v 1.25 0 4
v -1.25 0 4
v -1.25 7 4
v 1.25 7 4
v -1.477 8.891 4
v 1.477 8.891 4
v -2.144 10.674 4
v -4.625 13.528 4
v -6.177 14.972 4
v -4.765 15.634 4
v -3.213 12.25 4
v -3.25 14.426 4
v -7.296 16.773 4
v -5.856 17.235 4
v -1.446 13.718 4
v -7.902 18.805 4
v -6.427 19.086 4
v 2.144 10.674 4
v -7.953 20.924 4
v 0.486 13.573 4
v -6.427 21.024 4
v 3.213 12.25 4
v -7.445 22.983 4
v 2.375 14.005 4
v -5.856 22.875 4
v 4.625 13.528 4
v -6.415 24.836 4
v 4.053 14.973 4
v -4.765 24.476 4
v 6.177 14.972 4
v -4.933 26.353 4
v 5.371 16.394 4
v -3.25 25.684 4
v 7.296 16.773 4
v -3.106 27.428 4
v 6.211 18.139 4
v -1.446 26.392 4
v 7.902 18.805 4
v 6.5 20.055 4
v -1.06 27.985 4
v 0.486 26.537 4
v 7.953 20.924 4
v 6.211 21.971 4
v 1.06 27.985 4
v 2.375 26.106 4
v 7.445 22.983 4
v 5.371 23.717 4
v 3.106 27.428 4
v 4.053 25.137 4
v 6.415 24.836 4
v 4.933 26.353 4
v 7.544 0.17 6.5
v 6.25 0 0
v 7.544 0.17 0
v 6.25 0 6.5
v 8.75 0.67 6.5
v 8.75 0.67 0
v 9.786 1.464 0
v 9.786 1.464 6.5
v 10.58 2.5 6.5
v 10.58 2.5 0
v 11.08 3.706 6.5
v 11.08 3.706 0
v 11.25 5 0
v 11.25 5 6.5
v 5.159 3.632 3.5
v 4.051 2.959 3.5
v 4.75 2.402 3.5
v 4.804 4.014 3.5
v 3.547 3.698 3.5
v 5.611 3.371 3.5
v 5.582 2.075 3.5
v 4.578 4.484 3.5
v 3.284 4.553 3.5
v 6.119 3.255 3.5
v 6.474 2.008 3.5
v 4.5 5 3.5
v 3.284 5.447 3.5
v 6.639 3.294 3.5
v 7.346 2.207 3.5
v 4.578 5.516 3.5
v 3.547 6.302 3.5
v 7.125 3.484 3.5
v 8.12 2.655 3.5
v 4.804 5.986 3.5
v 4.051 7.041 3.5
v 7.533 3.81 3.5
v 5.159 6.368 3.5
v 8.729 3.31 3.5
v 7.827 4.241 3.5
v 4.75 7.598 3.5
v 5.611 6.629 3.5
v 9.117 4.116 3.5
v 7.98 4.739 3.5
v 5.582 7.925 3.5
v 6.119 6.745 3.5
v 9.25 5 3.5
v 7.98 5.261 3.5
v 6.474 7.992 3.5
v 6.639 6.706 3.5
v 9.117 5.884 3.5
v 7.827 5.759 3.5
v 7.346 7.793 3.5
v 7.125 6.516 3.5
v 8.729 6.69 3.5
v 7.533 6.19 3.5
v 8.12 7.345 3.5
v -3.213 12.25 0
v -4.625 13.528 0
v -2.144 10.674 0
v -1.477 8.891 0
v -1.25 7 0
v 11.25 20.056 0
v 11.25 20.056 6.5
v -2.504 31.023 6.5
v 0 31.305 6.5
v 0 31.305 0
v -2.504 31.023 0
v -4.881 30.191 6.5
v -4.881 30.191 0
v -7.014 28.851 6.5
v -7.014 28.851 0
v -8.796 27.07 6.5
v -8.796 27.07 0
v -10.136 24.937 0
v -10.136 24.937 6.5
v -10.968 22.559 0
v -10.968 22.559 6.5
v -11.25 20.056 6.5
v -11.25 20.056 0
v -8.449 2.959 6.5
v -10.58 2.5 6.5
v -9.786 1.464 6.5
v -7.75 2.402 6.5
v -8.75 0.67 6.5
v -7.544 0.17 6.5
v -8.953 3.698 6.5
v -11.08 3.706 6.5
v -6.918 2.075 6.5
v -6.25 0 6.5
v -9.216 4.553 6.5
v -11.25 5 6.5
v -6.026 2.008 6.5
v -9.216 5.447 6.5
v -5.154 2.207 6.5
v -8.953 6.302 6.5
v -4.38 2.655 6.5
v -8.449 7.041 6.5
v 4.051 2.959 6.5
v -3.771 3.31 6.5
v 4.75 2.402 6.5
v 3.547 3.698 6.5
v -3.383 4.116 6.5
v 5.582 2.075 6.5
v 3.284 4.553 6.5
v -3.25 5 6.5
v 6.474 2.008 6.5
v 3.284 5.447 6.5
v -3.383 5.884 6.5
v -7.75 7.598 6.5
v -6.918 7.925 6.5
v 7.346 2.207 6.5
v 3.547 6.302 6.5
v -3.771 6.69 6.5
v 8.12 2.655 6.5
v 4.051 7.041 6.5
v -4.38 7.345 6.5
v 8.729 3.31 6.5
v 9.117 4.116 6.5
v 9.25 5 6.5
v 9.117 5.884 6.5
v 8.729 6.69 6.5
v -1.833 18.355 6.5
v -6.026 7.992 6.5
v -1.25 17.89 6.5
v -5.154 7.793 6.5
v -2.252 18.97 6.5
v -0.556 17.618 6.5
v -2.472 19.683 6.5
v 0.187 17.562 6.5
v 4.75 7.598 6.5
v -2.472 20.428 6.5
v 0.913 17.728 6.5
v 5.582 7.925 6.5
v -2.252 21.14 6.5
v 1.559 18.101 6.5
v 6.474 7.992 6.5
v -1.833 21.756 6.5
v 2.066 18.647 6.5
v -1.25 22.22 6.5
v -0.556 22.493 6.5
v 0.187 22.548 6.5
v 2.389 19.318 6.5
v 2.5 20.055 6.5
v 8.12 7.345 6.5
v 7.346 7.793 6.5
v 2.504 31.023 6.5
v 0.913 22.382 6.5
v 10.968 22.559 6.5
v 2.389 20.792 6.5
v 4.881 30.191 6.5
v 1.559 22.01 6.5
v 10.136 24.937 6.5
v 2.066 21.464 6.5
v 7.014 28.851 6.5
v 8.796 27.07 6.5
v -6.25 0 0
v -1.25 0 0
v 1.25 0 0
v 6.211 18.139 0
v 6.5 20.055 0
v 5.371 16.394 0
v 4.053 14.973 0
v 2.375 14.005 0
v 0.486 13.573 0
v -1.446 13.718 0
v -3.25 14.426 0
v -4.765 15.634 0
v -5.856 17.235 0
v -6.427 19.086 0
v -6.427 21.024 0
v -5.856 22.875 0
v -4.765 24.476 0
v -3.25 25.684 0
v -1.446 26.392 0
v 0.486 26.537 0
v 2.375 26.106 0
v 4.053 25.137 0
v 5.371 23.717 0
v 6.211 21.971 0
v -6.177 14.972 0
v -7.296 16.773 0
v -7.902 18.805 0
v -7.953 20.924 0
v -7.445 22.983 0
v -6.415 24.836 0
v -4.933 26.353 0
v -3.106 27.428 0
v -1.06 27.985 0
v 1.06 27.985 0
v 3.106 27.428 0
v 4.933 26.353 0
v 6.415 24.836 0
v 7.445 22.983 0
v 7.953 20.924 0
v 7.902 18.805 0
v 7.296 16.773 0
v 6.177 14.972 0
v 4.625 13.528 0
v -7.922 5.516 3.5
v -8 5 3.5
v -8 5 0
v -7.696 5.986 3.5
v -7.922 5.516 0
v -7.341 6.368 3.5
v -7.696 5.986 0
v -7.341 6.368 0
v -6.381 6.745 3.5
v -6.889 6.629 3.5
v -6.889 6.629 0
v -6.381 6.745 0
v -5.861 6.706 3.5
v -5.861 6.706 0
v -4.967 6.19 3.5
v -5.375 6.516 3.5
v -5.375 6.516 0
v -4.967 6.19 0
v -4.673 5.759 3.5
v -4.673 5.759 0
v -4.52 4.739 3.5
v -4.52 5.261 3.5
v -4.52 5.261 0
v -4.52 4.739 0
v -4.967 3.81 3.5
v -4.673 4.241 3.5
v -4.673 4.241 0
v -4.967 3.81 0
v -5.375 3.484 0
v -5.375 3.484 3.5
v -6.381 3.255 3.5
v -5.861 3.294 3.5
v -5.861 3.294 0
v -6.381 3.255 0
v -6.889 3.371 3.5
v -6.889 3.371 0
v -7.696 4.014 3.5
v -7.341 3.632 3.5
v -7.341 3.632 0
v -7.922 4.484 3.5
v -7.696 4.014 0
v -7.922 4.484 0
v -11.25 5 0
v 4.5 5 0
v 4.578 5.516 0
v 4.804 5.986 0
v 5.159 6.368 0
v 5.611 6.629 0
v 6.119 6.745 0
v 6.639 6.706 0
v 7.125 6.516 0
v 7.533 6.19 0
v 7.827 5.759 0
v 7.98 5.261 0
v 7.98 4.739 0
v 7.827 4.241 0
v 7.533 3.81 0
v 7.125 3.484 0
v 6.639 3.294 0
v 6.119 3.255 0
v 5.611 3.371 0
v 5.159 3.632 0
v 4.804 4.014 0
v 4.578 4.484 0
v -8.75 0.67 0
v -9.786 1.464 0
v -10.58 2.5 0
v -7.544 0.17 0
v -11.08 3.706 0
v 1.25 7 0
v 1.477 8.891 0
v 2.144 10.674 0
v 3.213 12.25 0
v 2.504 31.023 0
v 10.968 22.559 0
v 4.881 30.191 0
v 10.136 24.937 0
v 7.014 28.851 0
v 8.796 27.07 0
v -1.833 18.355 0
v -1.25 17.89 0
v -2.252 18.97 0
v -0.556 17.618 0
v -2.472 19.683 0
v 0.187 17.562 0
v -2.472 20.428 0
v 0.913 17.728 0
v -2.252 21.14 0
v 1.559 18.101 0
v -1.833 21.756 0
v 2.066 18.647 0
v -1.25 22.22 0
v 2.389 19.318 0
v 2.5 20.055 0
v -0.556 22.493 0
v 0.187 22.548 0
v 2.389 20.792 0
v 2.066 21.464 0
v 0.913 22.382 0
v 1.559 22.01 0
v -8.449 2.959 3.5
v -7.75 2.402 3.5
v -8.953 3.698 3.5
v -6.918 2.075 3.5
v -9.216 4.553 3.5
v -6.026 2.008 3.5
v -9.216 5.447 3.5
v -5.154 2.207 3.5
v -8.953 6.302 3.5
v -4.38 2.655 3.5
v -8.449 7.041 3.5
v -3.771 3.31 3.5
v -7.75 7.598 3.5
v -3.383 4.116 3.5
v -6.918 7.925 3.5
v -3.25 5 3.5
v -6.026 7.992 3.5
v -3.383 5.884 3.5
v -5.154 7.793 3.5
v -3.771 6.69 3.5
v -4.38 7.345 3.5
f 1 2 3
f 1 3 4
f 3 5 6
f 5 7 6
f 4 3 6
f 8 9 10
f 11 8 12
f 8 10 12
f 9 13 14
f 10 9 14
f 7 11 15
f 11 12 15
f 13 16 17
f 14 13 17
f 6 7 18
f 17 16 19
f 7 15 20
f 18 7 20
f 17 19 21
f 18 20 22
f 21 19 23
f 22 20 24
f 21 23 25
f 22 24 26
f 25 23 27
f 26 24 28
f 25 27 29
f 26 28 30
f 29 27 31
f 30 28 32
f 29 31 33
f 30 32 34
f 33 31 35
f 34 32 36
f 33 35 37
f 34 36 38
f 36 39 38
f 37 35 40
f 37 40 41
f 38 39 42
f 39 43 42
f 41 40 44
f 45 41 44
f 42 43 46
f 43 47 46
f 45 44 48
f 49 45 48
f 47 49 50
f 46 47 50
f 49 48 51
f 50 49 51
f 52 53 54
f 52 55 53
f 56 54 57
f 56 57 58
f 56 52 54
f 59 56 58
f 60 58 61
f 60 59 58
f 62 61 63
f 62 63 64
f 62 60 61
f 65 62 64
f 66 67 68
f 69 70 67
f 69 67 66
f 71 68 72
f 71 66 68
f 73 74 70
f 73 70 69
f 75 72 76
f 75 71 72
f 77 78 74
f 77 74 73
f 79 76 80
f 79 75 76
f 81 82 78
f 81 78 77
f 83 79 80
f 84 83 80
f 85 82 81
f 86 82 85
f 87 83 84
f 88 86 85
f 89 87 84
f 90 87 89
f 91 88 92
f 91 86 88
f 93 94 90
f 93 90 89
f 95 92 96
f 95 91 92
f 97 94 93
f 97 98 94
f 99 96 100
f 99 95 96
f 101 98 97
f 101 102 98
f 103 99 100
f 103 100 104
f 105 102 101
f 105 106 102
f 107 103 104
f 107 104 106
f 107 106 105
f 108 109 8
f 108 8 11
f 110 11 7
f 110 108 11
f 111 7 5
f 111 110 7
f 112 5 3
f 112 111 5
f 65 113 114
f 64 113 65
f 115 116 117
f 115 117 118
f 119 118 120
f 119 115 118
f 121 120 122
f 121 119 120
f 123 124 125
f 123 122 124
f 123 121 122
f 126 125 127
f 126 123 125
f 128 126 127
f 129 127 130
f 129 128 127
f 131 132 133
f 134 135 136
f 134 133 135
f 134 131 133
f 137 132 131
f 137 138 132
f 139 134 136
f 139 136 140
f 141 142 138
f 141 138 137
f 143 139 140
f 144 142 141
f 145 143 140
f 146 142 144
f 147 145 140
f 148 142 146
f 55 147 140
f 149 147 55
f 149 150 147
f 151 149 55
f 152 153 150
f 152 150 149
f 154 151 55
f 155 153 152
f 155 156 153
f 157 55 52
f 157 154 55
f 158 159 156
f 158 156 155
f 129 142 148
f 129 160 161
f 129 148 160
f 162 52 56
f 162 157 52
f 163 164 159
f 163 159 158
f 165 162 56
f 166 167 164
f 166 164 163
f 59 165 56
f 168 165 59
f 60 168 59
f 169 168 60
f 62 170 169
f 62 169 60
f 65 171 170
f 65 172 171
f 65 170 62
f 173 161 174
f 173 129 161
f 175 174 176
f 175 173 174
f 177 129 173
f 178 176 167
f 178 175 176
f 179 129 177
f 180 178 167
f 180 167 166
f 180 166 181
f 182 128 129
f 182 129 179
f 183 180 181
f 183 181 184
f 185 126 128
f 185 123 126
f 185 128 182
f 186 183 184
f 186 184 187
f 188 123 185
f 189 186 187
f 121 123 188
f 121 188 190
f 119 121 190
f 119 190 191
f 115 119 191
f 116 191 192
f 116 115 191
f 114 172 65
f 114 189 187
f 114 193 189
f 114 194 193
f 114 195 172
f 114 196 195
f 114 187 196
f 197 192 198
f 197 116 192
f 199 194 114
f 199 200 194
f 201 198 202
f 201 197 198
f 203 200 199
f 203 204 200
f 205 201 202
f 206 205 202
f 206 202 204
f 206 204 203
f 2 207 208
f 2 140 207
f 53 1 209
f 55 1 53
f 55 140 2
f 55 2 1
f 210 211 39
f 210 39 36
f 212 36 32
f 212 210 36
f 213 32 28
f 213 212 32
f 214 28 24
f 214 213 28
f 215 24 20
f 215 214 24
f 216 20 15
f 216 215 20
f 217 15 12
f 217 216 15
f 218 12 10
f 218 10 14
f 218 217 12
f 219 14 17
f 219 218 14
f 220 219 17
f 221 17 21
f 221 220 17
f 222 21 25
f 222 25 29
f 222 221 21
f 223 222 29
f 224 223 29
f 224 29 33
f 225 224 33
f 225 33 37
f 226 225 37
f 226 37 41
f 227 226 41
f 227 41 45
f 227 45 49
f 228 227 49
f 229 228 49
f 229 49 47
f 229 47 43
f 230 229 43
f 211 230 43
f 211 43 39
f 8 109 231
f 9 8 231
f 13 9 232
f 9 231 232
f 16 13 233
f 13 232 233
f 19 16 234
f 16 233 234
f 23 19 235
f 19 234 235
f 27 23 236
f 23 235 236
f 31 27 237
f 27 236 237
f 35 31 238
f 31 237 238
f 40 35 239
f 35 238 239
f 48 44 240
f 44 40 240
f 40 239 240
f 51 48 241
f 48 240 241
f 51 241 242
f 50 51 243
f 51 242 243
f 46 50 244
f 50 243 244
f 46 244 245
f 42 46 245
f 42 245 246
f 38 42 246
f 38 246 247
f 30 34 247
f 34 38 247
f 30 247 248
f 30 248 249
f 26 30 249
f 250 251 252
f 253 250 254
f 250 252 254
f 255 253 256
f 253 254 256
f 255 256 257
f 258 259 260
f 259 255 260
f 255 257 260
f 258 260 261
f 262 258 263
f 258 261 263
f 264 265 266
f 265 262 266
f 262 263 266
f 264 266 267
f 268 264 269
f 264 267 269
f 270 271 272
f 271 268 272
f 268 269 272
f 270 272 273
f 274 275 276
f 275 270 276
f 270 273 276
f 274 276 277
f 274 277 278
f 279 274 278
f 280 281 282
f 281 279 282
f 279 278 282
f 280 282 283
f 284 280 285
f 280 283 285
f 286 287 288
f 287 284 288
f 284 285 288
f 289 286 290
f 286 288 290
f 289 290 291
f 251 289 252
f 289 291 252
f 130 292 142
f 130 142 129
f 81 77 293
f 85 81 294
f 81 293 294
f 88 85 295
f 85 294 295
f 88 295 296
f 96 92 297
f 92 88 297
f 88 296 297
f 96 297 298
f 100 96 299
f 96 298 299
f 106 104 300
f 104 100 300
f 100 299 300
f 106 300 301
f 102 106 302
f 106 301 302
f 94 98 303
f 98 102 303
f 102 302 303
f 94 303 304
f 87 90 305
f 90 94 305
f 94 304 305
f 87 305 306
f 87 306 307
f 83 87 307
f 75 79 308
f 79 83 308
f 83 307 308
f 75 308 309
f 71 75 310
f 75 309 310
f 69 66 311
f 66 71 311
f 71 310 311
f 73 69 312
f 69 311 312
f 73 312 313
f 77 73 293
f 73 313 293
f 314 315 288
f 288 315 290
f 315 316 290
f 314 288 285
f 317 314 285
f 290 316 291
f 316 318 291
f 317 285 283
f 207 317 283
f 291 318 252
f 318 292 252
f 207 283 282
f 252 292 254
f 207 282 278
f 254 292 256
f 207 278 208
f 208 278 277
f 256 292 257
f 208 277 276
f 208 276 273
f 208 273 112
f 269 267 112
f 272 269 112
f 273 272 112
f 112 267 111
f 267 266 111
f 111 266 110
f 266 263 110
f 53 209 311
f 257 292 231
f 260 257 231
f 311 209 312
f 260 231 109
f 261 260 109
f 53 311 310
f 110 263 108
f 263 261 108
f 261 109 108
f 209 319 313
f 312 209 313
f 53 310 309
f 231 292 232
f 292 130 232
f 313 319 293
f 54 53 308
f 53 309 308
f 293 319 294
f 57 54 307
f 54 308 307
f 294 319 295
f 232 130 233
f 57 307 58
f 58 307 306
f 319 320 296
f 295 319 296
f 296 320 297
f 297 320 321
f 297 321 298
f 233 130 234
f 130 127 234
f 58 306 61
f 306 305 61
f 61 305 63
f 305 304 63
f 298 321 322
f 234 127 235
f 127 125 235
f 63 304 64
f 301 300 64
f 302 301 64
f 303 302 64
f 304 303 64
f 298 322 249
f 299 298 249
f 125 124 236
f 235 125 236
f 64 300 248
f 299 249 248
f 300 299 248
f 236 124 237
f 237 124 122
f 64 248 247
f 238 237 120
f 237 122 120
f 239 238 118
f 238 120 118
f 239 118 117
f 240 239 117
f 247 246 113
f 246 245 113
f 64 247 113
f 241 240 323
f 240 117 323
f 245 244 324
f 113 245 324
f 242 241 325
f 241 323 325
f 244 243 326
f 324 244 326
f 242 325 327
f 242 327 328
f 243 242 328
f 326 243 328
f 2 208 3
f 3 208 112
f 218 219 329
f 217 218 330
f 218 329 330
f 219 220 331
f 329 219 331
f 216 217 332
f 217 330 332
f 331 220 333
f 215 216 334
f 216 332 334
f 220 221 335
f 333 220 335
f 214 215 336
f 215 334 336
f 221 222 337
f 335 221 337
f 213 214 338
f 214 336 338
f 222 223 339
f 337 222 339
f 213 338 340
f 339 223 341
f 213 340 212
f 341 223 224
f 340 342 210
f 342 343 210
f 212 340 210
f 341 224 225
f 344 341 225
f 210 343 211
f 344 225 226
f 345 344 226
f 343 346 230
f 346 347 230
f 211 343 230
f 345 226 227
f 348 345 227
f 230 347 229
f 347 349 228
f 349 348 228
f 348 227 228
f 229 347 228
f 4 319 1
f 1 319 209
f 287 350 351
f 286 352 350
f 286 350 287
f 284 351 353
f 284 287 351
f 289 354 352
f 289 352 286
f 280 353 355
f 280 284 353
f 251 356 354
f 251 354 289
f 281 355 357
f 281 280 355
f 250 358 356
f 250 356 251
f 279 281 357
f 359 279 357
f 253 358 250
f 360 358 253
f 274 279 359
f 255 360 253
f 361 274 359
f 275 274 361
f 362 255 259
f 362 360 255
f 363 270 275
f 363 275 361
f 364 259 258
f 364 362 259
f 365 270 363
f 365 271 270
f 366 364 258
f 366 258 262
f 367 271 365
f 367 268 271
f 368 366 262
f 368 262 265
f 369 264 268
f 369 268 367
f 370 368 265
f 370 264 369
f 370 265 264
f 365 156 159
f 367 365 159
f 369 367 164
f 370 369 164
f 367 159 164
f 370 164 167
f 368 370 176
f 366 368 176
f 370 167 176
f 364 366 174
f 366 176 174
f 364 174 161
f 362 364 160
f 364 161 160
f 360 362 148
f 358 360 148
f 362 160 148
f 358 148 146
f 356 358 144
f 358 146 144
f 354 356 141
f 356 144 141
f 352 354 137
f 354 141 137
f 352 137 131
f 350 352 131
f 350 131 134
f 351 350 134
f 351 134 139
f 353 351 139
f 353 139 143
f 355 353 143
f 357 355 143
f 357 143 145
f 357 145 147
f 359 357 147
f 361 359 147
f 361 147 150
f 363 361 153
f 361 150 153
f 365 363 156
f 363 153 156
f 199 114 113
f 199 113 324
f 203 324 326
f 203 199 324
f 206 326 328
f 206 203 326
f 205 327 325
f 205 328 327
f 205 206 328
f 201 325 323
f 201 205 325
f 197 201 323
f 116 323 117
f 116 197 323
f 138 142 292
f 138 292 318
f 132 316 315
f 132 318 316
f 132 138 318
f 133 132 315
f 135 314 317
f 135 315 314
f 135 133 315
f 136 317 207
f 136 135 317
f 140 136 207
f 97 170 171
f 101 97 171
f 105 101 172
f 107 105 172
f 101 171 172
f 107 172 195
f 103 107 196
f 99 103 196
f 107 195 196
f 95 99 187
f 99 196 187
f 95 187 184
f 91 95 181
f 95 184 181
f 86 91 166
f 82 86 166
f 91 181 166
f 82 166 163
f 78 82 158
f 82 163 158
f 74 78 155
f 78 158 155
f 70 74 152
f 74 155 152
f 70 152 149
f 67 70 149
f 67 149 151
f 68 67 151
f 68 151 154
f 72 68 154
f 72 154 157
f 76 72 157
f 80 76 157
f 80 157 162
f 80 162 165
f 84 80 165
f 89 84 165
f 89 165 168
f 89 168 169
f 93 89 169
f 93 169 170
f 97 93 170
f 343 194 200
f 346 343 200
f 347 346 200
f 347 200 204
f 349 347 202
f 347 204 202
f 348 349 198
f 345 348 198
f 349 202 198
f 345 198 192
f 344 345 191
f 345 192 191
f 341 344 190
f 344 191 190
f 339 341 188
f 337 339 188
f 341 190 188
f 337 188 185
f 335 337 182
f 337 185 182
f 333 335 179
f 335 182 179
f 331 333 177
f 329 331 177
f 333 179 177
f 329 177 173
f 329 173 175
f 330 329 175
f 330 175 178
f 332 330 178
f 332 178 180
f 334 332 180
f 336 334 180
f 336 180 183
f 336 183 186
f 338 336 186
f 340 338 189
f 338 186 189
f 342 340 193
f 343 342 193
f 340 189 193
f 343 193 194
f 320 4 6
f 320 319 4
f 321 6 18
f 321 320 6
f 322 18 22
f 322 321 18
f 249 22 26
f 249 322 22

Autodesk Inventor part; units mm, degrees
ref_plane "YZ Plane" through (0, 0, 0) normal (1, 0, 0) x (0, 1, 0)
ref_plane "XZ Plane" through (0, 0, 0) normal (0, 1, 0) x (-1, 0, 0)
ref_plane "XY Plane" through (0, 0, 0) normal (0, 0, 1) x (1, 0, 0)
sketch "Sketch1" plane through (0, 0, 0) normal (0, 0, 1) x (1, 0, 0)
  line L0 (-1.25, 0) -> (1.25, 0)
  line L1 (-1.25, 0) -> (-1.25, 7)
  arc A0 (-1.25, 7) -> (-4.625, 13.5276) centre (-9.25, 7) ccw
  arc A1 (4.625, 13.5276) -> (-4.625, 13.5276) centre (0, 20.0552) ccw
  arc A2 (4.625, 13.5276) -> (1.25, 7) centre (9.25, 7) ccw
  line L2 (1.25, 7) -> (1.25, 0)
  circle A3 centre (0, 20.0552) radius 6.5
  line L3 (-1.25, 0) -> (-11.25, 0)
  line L4 (-11.25, 0) -> (-11.25, 31.3052)
  line L5 (-11.25, 31.3052) -> (11.25, 31.3052)
  line L6 (11.25, 31.3052) -> (11.25, 0)
  line L7 (11.25, 0) -> (1.25, 0)
  point P0 (0, 0)
  point P1 (0, 0)
  dimension "d0" = 2.5
  dimension "d3" = 7
  dimension "d4" = 1.5
  dimension "d15" = 10
  dimension "d23" = 11.25
  dimension "d24" = 8
extrude "Extrusion1" add sketch "Sketch1" along normal blind 6.5 contours L3 L4 L5 L6 L7 L2 A2 A1 A0 L1 | A3
fillet "Fillet1" radius 11.25 2 edges at (11.25, 31.3052, 3.25) (-11.25, 31.3052, 3.25)
sketch "Sketch2" plane through (0, 0, 6.5) normal (0, 0, 1) x (1, 0, 0)
  line L0 (-1.25, 0) -> (-1.25, 7) projected
  arc A0 (-1.25, 7) -> (-4.625, 13.5276) centre (-9.25, 7) ccw projected
  arc A1 (4.625, 13.5276) -> (-4.625, 13.5276) centre (0, 20.0552) ccw projected
  arc A2 (4.625, 13.5276) -> (1.25, 7) centre (9.25, 7) ccw projected
  line L1 (1.25, 7) -> (1.25, 0) projected
  line L2 (11.25, 0) -> (11.25, 20.0552) projected
  line L3 (-1.25, 0) -> (1.25, 0)
  point P0 (0, 0)
extrude "Extrusion2" add sketch "Sketch2" against normal blind 2.5
sketch "Sketch3" plane through (0, 0, 0) normal (0, 0, -1) x (-1, 0, 0)
  line L0 (-1.25, 0) -> (-11.25, 0) projected
  line L1 (11.25, 0) -> (1.25, 0) projected
  circle A0 centre (-6.25, 5) radius 1.75
  circle A1 centre (6.25, 5) radius 1.75
  point P0 (0, 0)
  point P1 (-1.25, 22.4355)
  point P2 (-6.25, 0)
  point P3 (6.25, 0)
  dimension "d13" = 5
  dimension "d14" = 3.5
extrude "Extrusion3" cut sketch "Sketch3" against normal through all
sketch "Sketch4" plane through (0, 0, 6.5) normal (0, 0, 1) x (1, 0, 0)
  circle A0 centre (6.25, 5) radius 1.75 projected
  circle A1 centre (-6.25, 5) radius 1.75 projected
  circle A2 centre (-6.25, 5) radius 3
  circle A3 centre (6.25, 5) radius 3
  point P0 (0, 0)
  dimension "d19" = 6
extrude "Extrusion4" cut sketch "Sketch4" against normal blind 3
fillet "Fillet2" radius 5 2 edges at (-11.25, 0, 3.25) (11.25, 0, 3.25)
sketch "Sketch5" plane through (0, 0, 6.5) normal (0, 0, 1) x (1, 0, 0)
  arc A0 (11.25, 20.0552) -> (-11.25, 20.0552) centre (0, 20.0552) ccw projected
  circle A1 centre (0, 20.0552) radius 2.5
  point P0 (0, 0)
  dimension "d26" = 5
extrude "Extrusion5" cut sketch "Sketch5" against normal through all
equation "\"d9\" = d16"
equation "\"d16\" = 11.25"
properties part number "belt tensioner"
